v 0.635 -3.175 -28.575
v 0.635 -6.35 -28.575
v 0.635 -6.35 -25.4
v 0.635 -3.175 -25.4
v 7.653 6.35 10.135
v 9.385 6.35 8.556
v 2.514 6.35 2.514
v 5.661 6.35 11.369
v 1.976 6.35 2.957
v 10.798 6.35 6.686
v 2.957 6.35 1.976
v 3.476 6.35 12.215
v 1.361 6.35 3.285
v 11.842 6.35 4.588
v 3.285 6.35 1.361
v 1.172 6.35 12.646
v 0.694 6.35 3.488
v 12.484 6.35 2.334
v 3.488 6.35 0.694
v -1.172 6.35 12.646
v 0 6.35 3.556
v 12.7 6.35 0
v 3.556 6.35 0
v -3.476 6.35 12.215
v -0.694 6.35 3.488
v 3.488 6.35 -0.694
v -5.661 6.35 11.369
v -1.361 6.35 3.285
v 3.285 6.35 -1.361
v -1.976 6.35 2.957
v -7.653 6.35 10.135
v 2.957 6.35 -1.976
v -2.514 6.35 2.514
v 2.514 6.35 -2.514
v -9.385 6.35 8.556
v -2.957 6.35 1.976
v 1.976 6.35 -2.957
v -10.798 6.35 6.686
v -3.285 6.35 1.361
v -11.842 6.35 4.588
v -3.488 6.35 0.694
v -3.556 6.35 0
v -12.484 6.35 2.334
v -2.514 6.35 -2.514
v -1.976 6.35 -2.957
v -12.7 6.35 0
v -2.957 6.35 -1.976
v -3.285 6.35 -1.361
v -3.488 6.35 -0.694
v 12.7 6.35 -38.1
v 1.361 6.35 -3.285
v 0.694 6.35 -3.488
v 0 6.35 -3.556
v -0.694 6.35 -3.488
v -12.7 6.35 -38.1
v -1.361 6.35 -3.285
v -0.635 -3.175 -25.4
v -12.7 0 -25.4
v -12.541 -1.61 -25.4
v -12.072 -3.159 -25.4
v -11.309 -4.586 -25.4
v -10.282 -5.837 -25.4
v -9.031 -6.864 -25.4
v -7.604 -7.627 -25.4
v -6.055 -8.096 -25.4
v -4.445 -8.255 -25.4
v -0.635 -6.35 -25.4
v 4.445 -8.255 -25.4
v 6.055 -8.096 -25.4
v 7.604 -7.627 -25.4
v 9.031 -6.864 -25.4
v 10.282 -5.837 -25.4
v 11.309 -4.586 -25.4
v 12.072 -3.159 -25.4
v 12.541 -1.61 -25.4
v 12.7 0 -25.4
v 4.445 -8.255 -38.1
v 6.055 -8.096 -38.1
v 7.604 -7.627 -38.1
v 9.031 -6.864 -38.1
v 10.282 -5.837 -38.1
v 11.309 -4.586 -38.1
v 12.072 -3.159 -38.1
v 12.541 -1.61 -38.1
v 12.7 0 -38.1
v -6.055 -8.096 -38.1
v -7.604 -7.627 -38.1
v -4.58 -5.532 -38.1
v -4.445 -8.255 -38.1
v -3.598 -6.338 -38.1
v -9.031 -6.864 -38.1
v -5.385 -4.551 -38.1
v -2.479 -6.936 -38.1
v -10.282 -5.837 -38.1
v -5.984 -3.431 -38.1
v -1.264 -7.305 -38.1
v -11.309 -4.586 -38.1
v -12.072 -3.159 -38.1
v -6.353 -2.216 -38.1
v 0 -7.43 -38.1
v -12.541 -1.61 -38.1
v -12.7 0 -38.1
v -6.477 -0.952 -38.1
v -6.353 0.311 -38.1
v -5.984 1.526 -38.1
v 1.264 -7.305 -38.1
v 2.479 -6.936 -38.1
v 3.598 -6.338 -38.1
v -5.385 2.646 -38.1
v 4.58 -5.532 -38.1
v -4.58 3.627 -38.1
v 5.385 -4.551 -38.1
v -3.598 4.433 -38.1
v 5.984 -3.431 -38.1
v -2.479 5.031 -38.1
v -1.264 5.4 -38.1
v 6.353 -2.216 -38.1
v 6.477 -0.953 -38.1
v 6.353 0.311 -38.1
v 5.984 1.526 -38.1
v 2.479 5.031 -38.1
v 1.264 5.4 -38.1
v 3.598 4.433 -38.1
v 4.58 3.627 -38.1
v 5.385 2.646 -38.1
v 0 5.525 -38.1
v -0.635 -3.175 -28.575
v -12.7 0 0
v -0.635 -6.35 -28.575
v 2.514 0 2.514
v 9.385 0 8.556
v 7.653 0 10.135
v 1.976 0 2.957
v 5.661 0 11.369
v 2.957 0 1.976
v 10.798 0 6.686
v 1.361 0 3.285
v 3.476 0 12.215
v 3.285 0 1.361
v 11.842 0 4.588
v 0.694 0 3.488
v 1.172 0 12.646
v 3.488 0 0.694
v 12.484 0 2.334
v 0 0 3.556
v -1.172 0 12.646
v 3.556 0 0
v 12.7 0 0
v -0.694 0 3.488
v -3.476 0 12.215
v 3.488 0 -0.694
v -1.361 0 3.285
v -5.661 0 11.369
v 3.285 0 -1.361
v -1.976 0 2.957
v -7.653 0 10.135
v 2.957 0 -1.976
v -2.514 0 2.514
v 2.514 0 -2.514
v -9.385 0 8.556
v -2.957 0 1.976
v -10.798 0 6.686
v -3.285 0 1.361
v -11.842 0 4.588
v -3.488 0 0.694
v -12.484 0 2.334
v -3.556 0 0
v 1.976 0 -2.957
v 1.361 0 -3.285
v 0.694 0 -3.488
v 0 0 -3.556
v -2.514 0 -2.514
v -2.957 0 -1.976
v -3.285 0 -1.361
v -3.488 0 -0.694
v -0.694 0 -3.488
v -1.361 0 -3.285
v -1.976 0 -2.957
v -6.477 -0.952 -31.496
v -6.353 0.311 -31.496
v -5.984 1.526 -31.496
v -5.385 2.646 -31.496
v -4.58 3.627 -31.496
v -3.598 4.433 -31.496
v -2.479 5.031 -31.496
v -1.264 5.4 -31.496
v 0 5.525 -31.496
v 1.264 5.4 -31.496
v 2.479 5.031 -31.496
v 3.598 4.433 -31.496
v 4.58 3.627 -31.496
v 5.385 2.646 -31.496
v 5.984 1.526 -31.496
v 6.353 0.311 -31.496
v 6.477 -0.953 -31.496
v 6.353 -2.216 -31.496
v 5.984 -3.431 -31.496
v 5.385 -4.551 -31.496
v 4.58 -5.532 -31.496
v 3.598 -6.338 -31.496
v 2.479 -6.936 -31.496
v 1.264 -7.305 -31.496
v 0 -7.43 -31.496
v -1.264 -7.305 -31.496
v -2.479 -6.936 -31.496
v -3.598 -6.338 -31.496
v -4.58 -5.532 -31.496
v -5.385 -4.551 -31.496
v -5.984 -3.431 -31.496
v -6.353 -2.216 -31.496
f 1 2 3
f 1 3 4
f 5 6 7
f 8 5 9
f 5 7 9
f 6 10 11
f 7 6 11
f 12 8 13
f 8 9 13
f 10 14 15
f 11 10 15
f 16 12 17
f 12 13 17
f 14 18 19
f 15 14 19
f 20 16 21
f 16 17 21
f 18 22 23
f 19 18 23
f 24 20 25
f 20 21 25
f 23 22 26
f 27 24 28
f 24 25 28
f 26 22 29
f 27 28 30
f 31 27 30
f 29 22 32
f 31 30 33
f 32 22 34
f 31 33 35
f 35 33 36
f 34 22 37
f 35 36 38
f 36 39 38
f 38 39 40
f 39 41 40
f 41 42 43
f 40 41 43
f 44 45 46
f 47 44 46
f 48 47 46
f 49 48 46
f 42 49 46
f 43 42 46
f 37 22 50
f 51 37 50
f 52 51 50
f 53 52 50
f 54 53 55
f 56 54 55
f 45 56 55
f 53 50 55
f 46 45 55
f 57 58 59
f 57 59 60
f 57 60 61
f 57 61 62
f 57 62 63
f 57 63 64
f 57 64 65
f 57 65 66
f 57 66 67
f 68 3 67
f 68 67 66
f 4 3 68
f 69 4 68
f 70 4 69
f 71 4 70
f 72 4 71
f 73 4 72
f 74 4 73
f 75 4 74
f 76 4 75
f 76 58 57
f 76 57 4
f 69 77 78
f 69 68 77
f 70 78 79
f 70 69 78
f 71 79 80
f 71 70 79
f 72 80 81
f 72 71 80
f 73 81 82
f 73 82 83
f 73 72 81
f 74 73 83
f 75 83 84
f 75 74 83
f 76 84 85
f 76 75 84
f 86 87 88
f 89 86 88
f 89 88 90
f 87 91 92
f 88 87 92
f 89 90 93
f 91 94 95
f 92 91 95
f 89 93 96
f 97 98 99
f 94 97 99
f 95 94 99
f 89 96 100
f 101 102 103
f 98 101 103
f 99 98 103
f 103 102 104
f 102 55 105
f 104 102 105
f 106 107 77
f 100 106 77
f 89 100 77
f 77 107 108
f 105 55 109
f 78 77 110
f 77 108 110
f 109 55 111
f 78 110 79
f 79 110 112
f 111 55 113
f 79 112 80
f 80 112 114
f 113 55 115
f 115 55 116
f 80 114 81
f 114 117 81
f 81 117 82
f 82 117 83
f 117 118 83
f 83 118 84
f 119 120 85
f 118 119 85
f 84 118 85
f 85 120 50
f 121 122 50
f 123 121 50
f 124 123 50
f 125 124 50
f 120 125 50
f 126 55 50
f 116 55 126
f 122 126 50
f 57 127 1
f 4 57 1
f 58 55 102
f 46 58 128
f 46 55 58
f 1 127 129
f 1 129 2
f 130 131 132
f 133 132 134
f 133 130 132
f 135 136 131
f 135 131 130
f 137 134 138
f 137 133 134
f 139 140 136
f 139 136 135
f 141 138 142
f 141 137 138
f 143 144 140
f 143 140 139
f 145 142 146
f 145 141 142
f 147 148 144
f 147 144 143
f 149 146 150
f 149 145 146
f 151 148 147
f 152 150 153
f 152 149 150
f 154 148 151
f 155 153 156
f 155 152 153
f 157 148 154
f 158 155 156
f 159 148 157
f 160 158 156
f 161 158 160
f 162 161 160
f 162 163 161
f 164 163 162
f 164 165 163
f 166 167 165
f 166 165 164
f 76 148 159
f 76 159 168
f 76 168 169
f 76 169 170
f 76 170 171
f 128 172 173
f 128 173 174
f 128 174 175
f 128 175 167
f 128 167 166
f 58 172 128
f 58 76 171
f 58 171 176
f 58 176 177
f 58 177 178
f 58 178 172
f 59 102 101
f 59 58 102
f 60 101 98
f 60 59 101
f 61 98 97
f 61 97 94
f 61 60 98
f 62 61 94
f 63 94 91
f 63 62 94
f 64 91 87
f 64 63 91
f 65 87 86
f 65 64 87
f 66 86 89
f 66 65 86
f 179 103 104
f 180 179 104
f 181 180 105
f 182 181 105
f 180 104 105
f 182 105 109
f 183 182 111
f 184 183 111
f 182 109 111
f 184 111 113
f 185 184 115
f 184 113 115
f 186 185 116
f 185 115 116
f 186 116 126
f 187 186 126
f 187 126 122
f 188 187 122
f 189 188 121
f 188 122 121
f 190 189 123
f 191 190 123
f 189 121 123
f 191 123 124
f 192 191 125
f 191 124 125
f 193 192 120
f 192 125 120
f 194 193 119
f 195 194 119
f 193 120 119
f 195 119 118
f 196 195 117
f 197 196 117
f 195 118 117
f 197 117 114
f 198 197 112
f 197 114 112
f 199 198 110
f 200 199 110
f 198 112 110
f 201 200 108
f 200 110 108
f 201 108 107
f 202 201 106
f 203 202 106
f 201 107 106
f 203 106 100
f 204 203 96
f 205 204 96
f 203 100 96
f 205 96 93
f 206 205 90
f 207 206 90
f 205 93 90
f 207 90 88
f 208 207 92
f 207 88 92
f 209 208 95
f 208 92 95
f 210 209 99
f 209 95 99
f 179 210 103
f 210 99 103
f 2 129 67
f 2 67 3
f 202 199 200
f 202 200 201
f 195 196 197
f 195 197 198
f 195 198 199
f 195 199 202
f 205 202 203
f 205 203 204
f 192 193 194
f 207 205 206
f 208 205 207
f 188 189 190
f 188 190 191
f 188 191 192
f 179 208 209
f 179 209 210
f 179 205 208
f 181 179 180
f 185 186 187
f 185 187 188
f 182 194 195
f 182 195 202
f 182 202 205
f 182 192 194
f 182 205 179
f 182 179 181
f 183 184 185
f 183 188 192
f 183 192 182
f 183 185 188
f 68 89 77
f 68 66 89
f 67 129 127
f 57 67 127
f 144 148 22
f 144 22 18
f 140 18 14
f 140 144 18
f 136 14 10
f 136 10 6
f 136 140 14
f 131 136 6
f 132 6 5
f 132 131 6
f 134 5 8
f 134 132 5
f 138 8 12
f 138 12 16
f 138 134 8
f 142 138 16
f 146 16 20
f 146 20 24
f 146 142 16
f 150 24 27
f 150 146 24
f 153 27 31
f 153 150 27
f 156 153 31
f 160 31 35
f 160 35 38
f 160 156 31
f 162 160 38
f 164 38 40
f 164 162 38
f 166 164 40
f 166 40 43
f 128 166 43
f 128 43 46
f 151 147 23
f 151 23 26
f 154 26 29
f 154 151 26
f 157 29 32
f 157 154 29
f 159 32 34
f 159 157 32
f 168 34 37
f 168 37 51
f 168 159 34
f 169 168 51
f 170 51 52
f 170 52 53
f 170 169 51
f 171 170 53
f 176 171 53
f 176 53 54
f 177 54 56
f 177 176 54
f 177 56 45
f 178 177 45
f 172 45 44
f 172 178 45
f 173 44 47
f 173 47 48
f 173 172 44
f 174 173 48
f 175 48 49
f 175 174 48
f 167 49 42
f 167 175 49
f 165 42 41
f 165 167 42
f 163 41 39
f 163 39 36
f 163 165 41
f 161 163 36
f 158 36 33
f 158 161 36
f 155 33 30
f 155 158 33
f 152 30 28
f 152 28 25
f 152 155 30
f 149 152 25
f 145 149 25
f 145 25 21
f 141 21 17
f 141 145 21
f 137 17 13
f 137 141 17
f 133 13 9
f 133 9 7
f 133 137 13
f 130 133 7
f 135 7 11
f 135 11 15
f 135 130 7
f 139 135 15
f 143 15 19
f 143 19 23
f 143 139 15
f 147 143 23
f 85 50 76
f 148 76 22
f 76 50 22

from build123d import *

# Parameters (mm, degrees)
SKETCH1_R           = 3.556
BOSS_EXTRUDE2_DEPTH = 6.35
SKETCH2_W           = 25.4
SKETCH2_H           = 12.7
BOSS_EXTRUDE3_DEPTH = 8.255
SKETCH3_W           = 1.27
SKETCH3_H           = 3.175
CUT_EXTRUDE1_DEPTH  = 3.175
SKETCH4_R           = 6.477
CUT_EXTRUDE2_DEPTH  = 6.604
FILLET1_R           = 8.255


with BuildPart() as part:
    # Sketch1 → Boss-Extrude2 (new body)
    with BuildSketch(Plane(origin=(0, 0, 0), x_dir=(1, 0, 0), z_dir=(0, 1, 0))):
        with BuildLine():
            Line((-12.7, 0), (-12.7, 38.1))
            Line((-12.7, 38.1), (12.7, 38.1))
            Line((12.7, 38.1), (12.7, 0))
            ThreePointArc((12.7, 0), (0, -12.7), (-12.7, 0))
        make_face()
        Circle(SKETCH1_R, mode=Mode.SUBTRACT)
    extrude(amount=BOSS_EXTRUDE2_DEPTH)

    # Sketch2 → Boss-Extrude3 (add)
    with BuildSketch(Plane.XZ):
        with Locations((0, -31.75)):
            Rectangle(SKETCH2_W, SKETCH2_H)
    extrude(amount=BOSS_EXTRUDE3_DEPTH)

    # Sketch3 → Cut-Extrude1 (cut)
    with BuildSketch(Plane.XY.offset(-25.4)):
        with Locations((0, -4.7625)):
            Rectangle(SKETCH3_W, SKETCH3_H)
    extrude(amount=-CUT_EXTRUDE1_DEPTH, mode=Mode.SUBTRACT)

    # Sketch4 → Cut-Extrude2 (cut)
    with BuildSketch(Plane(origin=(0, 0, -38.1), x_dir=(-1, 0, 0), z_dir=(0, 0, -1))):
        with Locations((0, -0.9525)):
            Circle(SKETCH4_R)
    extrude(amount=-CUT_EXTRUDE2_DEPTH, mode=Mode.SUBTRACT)

    # Fillet1
    fillet1_edges = [part.edges().sort_by_distance(p)[0] for p in [
        (-12.7, -8.255, -31.75),
        (12.7, -8.255, -31.75),
    ]]
    fillet(fillet1_edges, radius=FILLET1_R)


solid = part.part
